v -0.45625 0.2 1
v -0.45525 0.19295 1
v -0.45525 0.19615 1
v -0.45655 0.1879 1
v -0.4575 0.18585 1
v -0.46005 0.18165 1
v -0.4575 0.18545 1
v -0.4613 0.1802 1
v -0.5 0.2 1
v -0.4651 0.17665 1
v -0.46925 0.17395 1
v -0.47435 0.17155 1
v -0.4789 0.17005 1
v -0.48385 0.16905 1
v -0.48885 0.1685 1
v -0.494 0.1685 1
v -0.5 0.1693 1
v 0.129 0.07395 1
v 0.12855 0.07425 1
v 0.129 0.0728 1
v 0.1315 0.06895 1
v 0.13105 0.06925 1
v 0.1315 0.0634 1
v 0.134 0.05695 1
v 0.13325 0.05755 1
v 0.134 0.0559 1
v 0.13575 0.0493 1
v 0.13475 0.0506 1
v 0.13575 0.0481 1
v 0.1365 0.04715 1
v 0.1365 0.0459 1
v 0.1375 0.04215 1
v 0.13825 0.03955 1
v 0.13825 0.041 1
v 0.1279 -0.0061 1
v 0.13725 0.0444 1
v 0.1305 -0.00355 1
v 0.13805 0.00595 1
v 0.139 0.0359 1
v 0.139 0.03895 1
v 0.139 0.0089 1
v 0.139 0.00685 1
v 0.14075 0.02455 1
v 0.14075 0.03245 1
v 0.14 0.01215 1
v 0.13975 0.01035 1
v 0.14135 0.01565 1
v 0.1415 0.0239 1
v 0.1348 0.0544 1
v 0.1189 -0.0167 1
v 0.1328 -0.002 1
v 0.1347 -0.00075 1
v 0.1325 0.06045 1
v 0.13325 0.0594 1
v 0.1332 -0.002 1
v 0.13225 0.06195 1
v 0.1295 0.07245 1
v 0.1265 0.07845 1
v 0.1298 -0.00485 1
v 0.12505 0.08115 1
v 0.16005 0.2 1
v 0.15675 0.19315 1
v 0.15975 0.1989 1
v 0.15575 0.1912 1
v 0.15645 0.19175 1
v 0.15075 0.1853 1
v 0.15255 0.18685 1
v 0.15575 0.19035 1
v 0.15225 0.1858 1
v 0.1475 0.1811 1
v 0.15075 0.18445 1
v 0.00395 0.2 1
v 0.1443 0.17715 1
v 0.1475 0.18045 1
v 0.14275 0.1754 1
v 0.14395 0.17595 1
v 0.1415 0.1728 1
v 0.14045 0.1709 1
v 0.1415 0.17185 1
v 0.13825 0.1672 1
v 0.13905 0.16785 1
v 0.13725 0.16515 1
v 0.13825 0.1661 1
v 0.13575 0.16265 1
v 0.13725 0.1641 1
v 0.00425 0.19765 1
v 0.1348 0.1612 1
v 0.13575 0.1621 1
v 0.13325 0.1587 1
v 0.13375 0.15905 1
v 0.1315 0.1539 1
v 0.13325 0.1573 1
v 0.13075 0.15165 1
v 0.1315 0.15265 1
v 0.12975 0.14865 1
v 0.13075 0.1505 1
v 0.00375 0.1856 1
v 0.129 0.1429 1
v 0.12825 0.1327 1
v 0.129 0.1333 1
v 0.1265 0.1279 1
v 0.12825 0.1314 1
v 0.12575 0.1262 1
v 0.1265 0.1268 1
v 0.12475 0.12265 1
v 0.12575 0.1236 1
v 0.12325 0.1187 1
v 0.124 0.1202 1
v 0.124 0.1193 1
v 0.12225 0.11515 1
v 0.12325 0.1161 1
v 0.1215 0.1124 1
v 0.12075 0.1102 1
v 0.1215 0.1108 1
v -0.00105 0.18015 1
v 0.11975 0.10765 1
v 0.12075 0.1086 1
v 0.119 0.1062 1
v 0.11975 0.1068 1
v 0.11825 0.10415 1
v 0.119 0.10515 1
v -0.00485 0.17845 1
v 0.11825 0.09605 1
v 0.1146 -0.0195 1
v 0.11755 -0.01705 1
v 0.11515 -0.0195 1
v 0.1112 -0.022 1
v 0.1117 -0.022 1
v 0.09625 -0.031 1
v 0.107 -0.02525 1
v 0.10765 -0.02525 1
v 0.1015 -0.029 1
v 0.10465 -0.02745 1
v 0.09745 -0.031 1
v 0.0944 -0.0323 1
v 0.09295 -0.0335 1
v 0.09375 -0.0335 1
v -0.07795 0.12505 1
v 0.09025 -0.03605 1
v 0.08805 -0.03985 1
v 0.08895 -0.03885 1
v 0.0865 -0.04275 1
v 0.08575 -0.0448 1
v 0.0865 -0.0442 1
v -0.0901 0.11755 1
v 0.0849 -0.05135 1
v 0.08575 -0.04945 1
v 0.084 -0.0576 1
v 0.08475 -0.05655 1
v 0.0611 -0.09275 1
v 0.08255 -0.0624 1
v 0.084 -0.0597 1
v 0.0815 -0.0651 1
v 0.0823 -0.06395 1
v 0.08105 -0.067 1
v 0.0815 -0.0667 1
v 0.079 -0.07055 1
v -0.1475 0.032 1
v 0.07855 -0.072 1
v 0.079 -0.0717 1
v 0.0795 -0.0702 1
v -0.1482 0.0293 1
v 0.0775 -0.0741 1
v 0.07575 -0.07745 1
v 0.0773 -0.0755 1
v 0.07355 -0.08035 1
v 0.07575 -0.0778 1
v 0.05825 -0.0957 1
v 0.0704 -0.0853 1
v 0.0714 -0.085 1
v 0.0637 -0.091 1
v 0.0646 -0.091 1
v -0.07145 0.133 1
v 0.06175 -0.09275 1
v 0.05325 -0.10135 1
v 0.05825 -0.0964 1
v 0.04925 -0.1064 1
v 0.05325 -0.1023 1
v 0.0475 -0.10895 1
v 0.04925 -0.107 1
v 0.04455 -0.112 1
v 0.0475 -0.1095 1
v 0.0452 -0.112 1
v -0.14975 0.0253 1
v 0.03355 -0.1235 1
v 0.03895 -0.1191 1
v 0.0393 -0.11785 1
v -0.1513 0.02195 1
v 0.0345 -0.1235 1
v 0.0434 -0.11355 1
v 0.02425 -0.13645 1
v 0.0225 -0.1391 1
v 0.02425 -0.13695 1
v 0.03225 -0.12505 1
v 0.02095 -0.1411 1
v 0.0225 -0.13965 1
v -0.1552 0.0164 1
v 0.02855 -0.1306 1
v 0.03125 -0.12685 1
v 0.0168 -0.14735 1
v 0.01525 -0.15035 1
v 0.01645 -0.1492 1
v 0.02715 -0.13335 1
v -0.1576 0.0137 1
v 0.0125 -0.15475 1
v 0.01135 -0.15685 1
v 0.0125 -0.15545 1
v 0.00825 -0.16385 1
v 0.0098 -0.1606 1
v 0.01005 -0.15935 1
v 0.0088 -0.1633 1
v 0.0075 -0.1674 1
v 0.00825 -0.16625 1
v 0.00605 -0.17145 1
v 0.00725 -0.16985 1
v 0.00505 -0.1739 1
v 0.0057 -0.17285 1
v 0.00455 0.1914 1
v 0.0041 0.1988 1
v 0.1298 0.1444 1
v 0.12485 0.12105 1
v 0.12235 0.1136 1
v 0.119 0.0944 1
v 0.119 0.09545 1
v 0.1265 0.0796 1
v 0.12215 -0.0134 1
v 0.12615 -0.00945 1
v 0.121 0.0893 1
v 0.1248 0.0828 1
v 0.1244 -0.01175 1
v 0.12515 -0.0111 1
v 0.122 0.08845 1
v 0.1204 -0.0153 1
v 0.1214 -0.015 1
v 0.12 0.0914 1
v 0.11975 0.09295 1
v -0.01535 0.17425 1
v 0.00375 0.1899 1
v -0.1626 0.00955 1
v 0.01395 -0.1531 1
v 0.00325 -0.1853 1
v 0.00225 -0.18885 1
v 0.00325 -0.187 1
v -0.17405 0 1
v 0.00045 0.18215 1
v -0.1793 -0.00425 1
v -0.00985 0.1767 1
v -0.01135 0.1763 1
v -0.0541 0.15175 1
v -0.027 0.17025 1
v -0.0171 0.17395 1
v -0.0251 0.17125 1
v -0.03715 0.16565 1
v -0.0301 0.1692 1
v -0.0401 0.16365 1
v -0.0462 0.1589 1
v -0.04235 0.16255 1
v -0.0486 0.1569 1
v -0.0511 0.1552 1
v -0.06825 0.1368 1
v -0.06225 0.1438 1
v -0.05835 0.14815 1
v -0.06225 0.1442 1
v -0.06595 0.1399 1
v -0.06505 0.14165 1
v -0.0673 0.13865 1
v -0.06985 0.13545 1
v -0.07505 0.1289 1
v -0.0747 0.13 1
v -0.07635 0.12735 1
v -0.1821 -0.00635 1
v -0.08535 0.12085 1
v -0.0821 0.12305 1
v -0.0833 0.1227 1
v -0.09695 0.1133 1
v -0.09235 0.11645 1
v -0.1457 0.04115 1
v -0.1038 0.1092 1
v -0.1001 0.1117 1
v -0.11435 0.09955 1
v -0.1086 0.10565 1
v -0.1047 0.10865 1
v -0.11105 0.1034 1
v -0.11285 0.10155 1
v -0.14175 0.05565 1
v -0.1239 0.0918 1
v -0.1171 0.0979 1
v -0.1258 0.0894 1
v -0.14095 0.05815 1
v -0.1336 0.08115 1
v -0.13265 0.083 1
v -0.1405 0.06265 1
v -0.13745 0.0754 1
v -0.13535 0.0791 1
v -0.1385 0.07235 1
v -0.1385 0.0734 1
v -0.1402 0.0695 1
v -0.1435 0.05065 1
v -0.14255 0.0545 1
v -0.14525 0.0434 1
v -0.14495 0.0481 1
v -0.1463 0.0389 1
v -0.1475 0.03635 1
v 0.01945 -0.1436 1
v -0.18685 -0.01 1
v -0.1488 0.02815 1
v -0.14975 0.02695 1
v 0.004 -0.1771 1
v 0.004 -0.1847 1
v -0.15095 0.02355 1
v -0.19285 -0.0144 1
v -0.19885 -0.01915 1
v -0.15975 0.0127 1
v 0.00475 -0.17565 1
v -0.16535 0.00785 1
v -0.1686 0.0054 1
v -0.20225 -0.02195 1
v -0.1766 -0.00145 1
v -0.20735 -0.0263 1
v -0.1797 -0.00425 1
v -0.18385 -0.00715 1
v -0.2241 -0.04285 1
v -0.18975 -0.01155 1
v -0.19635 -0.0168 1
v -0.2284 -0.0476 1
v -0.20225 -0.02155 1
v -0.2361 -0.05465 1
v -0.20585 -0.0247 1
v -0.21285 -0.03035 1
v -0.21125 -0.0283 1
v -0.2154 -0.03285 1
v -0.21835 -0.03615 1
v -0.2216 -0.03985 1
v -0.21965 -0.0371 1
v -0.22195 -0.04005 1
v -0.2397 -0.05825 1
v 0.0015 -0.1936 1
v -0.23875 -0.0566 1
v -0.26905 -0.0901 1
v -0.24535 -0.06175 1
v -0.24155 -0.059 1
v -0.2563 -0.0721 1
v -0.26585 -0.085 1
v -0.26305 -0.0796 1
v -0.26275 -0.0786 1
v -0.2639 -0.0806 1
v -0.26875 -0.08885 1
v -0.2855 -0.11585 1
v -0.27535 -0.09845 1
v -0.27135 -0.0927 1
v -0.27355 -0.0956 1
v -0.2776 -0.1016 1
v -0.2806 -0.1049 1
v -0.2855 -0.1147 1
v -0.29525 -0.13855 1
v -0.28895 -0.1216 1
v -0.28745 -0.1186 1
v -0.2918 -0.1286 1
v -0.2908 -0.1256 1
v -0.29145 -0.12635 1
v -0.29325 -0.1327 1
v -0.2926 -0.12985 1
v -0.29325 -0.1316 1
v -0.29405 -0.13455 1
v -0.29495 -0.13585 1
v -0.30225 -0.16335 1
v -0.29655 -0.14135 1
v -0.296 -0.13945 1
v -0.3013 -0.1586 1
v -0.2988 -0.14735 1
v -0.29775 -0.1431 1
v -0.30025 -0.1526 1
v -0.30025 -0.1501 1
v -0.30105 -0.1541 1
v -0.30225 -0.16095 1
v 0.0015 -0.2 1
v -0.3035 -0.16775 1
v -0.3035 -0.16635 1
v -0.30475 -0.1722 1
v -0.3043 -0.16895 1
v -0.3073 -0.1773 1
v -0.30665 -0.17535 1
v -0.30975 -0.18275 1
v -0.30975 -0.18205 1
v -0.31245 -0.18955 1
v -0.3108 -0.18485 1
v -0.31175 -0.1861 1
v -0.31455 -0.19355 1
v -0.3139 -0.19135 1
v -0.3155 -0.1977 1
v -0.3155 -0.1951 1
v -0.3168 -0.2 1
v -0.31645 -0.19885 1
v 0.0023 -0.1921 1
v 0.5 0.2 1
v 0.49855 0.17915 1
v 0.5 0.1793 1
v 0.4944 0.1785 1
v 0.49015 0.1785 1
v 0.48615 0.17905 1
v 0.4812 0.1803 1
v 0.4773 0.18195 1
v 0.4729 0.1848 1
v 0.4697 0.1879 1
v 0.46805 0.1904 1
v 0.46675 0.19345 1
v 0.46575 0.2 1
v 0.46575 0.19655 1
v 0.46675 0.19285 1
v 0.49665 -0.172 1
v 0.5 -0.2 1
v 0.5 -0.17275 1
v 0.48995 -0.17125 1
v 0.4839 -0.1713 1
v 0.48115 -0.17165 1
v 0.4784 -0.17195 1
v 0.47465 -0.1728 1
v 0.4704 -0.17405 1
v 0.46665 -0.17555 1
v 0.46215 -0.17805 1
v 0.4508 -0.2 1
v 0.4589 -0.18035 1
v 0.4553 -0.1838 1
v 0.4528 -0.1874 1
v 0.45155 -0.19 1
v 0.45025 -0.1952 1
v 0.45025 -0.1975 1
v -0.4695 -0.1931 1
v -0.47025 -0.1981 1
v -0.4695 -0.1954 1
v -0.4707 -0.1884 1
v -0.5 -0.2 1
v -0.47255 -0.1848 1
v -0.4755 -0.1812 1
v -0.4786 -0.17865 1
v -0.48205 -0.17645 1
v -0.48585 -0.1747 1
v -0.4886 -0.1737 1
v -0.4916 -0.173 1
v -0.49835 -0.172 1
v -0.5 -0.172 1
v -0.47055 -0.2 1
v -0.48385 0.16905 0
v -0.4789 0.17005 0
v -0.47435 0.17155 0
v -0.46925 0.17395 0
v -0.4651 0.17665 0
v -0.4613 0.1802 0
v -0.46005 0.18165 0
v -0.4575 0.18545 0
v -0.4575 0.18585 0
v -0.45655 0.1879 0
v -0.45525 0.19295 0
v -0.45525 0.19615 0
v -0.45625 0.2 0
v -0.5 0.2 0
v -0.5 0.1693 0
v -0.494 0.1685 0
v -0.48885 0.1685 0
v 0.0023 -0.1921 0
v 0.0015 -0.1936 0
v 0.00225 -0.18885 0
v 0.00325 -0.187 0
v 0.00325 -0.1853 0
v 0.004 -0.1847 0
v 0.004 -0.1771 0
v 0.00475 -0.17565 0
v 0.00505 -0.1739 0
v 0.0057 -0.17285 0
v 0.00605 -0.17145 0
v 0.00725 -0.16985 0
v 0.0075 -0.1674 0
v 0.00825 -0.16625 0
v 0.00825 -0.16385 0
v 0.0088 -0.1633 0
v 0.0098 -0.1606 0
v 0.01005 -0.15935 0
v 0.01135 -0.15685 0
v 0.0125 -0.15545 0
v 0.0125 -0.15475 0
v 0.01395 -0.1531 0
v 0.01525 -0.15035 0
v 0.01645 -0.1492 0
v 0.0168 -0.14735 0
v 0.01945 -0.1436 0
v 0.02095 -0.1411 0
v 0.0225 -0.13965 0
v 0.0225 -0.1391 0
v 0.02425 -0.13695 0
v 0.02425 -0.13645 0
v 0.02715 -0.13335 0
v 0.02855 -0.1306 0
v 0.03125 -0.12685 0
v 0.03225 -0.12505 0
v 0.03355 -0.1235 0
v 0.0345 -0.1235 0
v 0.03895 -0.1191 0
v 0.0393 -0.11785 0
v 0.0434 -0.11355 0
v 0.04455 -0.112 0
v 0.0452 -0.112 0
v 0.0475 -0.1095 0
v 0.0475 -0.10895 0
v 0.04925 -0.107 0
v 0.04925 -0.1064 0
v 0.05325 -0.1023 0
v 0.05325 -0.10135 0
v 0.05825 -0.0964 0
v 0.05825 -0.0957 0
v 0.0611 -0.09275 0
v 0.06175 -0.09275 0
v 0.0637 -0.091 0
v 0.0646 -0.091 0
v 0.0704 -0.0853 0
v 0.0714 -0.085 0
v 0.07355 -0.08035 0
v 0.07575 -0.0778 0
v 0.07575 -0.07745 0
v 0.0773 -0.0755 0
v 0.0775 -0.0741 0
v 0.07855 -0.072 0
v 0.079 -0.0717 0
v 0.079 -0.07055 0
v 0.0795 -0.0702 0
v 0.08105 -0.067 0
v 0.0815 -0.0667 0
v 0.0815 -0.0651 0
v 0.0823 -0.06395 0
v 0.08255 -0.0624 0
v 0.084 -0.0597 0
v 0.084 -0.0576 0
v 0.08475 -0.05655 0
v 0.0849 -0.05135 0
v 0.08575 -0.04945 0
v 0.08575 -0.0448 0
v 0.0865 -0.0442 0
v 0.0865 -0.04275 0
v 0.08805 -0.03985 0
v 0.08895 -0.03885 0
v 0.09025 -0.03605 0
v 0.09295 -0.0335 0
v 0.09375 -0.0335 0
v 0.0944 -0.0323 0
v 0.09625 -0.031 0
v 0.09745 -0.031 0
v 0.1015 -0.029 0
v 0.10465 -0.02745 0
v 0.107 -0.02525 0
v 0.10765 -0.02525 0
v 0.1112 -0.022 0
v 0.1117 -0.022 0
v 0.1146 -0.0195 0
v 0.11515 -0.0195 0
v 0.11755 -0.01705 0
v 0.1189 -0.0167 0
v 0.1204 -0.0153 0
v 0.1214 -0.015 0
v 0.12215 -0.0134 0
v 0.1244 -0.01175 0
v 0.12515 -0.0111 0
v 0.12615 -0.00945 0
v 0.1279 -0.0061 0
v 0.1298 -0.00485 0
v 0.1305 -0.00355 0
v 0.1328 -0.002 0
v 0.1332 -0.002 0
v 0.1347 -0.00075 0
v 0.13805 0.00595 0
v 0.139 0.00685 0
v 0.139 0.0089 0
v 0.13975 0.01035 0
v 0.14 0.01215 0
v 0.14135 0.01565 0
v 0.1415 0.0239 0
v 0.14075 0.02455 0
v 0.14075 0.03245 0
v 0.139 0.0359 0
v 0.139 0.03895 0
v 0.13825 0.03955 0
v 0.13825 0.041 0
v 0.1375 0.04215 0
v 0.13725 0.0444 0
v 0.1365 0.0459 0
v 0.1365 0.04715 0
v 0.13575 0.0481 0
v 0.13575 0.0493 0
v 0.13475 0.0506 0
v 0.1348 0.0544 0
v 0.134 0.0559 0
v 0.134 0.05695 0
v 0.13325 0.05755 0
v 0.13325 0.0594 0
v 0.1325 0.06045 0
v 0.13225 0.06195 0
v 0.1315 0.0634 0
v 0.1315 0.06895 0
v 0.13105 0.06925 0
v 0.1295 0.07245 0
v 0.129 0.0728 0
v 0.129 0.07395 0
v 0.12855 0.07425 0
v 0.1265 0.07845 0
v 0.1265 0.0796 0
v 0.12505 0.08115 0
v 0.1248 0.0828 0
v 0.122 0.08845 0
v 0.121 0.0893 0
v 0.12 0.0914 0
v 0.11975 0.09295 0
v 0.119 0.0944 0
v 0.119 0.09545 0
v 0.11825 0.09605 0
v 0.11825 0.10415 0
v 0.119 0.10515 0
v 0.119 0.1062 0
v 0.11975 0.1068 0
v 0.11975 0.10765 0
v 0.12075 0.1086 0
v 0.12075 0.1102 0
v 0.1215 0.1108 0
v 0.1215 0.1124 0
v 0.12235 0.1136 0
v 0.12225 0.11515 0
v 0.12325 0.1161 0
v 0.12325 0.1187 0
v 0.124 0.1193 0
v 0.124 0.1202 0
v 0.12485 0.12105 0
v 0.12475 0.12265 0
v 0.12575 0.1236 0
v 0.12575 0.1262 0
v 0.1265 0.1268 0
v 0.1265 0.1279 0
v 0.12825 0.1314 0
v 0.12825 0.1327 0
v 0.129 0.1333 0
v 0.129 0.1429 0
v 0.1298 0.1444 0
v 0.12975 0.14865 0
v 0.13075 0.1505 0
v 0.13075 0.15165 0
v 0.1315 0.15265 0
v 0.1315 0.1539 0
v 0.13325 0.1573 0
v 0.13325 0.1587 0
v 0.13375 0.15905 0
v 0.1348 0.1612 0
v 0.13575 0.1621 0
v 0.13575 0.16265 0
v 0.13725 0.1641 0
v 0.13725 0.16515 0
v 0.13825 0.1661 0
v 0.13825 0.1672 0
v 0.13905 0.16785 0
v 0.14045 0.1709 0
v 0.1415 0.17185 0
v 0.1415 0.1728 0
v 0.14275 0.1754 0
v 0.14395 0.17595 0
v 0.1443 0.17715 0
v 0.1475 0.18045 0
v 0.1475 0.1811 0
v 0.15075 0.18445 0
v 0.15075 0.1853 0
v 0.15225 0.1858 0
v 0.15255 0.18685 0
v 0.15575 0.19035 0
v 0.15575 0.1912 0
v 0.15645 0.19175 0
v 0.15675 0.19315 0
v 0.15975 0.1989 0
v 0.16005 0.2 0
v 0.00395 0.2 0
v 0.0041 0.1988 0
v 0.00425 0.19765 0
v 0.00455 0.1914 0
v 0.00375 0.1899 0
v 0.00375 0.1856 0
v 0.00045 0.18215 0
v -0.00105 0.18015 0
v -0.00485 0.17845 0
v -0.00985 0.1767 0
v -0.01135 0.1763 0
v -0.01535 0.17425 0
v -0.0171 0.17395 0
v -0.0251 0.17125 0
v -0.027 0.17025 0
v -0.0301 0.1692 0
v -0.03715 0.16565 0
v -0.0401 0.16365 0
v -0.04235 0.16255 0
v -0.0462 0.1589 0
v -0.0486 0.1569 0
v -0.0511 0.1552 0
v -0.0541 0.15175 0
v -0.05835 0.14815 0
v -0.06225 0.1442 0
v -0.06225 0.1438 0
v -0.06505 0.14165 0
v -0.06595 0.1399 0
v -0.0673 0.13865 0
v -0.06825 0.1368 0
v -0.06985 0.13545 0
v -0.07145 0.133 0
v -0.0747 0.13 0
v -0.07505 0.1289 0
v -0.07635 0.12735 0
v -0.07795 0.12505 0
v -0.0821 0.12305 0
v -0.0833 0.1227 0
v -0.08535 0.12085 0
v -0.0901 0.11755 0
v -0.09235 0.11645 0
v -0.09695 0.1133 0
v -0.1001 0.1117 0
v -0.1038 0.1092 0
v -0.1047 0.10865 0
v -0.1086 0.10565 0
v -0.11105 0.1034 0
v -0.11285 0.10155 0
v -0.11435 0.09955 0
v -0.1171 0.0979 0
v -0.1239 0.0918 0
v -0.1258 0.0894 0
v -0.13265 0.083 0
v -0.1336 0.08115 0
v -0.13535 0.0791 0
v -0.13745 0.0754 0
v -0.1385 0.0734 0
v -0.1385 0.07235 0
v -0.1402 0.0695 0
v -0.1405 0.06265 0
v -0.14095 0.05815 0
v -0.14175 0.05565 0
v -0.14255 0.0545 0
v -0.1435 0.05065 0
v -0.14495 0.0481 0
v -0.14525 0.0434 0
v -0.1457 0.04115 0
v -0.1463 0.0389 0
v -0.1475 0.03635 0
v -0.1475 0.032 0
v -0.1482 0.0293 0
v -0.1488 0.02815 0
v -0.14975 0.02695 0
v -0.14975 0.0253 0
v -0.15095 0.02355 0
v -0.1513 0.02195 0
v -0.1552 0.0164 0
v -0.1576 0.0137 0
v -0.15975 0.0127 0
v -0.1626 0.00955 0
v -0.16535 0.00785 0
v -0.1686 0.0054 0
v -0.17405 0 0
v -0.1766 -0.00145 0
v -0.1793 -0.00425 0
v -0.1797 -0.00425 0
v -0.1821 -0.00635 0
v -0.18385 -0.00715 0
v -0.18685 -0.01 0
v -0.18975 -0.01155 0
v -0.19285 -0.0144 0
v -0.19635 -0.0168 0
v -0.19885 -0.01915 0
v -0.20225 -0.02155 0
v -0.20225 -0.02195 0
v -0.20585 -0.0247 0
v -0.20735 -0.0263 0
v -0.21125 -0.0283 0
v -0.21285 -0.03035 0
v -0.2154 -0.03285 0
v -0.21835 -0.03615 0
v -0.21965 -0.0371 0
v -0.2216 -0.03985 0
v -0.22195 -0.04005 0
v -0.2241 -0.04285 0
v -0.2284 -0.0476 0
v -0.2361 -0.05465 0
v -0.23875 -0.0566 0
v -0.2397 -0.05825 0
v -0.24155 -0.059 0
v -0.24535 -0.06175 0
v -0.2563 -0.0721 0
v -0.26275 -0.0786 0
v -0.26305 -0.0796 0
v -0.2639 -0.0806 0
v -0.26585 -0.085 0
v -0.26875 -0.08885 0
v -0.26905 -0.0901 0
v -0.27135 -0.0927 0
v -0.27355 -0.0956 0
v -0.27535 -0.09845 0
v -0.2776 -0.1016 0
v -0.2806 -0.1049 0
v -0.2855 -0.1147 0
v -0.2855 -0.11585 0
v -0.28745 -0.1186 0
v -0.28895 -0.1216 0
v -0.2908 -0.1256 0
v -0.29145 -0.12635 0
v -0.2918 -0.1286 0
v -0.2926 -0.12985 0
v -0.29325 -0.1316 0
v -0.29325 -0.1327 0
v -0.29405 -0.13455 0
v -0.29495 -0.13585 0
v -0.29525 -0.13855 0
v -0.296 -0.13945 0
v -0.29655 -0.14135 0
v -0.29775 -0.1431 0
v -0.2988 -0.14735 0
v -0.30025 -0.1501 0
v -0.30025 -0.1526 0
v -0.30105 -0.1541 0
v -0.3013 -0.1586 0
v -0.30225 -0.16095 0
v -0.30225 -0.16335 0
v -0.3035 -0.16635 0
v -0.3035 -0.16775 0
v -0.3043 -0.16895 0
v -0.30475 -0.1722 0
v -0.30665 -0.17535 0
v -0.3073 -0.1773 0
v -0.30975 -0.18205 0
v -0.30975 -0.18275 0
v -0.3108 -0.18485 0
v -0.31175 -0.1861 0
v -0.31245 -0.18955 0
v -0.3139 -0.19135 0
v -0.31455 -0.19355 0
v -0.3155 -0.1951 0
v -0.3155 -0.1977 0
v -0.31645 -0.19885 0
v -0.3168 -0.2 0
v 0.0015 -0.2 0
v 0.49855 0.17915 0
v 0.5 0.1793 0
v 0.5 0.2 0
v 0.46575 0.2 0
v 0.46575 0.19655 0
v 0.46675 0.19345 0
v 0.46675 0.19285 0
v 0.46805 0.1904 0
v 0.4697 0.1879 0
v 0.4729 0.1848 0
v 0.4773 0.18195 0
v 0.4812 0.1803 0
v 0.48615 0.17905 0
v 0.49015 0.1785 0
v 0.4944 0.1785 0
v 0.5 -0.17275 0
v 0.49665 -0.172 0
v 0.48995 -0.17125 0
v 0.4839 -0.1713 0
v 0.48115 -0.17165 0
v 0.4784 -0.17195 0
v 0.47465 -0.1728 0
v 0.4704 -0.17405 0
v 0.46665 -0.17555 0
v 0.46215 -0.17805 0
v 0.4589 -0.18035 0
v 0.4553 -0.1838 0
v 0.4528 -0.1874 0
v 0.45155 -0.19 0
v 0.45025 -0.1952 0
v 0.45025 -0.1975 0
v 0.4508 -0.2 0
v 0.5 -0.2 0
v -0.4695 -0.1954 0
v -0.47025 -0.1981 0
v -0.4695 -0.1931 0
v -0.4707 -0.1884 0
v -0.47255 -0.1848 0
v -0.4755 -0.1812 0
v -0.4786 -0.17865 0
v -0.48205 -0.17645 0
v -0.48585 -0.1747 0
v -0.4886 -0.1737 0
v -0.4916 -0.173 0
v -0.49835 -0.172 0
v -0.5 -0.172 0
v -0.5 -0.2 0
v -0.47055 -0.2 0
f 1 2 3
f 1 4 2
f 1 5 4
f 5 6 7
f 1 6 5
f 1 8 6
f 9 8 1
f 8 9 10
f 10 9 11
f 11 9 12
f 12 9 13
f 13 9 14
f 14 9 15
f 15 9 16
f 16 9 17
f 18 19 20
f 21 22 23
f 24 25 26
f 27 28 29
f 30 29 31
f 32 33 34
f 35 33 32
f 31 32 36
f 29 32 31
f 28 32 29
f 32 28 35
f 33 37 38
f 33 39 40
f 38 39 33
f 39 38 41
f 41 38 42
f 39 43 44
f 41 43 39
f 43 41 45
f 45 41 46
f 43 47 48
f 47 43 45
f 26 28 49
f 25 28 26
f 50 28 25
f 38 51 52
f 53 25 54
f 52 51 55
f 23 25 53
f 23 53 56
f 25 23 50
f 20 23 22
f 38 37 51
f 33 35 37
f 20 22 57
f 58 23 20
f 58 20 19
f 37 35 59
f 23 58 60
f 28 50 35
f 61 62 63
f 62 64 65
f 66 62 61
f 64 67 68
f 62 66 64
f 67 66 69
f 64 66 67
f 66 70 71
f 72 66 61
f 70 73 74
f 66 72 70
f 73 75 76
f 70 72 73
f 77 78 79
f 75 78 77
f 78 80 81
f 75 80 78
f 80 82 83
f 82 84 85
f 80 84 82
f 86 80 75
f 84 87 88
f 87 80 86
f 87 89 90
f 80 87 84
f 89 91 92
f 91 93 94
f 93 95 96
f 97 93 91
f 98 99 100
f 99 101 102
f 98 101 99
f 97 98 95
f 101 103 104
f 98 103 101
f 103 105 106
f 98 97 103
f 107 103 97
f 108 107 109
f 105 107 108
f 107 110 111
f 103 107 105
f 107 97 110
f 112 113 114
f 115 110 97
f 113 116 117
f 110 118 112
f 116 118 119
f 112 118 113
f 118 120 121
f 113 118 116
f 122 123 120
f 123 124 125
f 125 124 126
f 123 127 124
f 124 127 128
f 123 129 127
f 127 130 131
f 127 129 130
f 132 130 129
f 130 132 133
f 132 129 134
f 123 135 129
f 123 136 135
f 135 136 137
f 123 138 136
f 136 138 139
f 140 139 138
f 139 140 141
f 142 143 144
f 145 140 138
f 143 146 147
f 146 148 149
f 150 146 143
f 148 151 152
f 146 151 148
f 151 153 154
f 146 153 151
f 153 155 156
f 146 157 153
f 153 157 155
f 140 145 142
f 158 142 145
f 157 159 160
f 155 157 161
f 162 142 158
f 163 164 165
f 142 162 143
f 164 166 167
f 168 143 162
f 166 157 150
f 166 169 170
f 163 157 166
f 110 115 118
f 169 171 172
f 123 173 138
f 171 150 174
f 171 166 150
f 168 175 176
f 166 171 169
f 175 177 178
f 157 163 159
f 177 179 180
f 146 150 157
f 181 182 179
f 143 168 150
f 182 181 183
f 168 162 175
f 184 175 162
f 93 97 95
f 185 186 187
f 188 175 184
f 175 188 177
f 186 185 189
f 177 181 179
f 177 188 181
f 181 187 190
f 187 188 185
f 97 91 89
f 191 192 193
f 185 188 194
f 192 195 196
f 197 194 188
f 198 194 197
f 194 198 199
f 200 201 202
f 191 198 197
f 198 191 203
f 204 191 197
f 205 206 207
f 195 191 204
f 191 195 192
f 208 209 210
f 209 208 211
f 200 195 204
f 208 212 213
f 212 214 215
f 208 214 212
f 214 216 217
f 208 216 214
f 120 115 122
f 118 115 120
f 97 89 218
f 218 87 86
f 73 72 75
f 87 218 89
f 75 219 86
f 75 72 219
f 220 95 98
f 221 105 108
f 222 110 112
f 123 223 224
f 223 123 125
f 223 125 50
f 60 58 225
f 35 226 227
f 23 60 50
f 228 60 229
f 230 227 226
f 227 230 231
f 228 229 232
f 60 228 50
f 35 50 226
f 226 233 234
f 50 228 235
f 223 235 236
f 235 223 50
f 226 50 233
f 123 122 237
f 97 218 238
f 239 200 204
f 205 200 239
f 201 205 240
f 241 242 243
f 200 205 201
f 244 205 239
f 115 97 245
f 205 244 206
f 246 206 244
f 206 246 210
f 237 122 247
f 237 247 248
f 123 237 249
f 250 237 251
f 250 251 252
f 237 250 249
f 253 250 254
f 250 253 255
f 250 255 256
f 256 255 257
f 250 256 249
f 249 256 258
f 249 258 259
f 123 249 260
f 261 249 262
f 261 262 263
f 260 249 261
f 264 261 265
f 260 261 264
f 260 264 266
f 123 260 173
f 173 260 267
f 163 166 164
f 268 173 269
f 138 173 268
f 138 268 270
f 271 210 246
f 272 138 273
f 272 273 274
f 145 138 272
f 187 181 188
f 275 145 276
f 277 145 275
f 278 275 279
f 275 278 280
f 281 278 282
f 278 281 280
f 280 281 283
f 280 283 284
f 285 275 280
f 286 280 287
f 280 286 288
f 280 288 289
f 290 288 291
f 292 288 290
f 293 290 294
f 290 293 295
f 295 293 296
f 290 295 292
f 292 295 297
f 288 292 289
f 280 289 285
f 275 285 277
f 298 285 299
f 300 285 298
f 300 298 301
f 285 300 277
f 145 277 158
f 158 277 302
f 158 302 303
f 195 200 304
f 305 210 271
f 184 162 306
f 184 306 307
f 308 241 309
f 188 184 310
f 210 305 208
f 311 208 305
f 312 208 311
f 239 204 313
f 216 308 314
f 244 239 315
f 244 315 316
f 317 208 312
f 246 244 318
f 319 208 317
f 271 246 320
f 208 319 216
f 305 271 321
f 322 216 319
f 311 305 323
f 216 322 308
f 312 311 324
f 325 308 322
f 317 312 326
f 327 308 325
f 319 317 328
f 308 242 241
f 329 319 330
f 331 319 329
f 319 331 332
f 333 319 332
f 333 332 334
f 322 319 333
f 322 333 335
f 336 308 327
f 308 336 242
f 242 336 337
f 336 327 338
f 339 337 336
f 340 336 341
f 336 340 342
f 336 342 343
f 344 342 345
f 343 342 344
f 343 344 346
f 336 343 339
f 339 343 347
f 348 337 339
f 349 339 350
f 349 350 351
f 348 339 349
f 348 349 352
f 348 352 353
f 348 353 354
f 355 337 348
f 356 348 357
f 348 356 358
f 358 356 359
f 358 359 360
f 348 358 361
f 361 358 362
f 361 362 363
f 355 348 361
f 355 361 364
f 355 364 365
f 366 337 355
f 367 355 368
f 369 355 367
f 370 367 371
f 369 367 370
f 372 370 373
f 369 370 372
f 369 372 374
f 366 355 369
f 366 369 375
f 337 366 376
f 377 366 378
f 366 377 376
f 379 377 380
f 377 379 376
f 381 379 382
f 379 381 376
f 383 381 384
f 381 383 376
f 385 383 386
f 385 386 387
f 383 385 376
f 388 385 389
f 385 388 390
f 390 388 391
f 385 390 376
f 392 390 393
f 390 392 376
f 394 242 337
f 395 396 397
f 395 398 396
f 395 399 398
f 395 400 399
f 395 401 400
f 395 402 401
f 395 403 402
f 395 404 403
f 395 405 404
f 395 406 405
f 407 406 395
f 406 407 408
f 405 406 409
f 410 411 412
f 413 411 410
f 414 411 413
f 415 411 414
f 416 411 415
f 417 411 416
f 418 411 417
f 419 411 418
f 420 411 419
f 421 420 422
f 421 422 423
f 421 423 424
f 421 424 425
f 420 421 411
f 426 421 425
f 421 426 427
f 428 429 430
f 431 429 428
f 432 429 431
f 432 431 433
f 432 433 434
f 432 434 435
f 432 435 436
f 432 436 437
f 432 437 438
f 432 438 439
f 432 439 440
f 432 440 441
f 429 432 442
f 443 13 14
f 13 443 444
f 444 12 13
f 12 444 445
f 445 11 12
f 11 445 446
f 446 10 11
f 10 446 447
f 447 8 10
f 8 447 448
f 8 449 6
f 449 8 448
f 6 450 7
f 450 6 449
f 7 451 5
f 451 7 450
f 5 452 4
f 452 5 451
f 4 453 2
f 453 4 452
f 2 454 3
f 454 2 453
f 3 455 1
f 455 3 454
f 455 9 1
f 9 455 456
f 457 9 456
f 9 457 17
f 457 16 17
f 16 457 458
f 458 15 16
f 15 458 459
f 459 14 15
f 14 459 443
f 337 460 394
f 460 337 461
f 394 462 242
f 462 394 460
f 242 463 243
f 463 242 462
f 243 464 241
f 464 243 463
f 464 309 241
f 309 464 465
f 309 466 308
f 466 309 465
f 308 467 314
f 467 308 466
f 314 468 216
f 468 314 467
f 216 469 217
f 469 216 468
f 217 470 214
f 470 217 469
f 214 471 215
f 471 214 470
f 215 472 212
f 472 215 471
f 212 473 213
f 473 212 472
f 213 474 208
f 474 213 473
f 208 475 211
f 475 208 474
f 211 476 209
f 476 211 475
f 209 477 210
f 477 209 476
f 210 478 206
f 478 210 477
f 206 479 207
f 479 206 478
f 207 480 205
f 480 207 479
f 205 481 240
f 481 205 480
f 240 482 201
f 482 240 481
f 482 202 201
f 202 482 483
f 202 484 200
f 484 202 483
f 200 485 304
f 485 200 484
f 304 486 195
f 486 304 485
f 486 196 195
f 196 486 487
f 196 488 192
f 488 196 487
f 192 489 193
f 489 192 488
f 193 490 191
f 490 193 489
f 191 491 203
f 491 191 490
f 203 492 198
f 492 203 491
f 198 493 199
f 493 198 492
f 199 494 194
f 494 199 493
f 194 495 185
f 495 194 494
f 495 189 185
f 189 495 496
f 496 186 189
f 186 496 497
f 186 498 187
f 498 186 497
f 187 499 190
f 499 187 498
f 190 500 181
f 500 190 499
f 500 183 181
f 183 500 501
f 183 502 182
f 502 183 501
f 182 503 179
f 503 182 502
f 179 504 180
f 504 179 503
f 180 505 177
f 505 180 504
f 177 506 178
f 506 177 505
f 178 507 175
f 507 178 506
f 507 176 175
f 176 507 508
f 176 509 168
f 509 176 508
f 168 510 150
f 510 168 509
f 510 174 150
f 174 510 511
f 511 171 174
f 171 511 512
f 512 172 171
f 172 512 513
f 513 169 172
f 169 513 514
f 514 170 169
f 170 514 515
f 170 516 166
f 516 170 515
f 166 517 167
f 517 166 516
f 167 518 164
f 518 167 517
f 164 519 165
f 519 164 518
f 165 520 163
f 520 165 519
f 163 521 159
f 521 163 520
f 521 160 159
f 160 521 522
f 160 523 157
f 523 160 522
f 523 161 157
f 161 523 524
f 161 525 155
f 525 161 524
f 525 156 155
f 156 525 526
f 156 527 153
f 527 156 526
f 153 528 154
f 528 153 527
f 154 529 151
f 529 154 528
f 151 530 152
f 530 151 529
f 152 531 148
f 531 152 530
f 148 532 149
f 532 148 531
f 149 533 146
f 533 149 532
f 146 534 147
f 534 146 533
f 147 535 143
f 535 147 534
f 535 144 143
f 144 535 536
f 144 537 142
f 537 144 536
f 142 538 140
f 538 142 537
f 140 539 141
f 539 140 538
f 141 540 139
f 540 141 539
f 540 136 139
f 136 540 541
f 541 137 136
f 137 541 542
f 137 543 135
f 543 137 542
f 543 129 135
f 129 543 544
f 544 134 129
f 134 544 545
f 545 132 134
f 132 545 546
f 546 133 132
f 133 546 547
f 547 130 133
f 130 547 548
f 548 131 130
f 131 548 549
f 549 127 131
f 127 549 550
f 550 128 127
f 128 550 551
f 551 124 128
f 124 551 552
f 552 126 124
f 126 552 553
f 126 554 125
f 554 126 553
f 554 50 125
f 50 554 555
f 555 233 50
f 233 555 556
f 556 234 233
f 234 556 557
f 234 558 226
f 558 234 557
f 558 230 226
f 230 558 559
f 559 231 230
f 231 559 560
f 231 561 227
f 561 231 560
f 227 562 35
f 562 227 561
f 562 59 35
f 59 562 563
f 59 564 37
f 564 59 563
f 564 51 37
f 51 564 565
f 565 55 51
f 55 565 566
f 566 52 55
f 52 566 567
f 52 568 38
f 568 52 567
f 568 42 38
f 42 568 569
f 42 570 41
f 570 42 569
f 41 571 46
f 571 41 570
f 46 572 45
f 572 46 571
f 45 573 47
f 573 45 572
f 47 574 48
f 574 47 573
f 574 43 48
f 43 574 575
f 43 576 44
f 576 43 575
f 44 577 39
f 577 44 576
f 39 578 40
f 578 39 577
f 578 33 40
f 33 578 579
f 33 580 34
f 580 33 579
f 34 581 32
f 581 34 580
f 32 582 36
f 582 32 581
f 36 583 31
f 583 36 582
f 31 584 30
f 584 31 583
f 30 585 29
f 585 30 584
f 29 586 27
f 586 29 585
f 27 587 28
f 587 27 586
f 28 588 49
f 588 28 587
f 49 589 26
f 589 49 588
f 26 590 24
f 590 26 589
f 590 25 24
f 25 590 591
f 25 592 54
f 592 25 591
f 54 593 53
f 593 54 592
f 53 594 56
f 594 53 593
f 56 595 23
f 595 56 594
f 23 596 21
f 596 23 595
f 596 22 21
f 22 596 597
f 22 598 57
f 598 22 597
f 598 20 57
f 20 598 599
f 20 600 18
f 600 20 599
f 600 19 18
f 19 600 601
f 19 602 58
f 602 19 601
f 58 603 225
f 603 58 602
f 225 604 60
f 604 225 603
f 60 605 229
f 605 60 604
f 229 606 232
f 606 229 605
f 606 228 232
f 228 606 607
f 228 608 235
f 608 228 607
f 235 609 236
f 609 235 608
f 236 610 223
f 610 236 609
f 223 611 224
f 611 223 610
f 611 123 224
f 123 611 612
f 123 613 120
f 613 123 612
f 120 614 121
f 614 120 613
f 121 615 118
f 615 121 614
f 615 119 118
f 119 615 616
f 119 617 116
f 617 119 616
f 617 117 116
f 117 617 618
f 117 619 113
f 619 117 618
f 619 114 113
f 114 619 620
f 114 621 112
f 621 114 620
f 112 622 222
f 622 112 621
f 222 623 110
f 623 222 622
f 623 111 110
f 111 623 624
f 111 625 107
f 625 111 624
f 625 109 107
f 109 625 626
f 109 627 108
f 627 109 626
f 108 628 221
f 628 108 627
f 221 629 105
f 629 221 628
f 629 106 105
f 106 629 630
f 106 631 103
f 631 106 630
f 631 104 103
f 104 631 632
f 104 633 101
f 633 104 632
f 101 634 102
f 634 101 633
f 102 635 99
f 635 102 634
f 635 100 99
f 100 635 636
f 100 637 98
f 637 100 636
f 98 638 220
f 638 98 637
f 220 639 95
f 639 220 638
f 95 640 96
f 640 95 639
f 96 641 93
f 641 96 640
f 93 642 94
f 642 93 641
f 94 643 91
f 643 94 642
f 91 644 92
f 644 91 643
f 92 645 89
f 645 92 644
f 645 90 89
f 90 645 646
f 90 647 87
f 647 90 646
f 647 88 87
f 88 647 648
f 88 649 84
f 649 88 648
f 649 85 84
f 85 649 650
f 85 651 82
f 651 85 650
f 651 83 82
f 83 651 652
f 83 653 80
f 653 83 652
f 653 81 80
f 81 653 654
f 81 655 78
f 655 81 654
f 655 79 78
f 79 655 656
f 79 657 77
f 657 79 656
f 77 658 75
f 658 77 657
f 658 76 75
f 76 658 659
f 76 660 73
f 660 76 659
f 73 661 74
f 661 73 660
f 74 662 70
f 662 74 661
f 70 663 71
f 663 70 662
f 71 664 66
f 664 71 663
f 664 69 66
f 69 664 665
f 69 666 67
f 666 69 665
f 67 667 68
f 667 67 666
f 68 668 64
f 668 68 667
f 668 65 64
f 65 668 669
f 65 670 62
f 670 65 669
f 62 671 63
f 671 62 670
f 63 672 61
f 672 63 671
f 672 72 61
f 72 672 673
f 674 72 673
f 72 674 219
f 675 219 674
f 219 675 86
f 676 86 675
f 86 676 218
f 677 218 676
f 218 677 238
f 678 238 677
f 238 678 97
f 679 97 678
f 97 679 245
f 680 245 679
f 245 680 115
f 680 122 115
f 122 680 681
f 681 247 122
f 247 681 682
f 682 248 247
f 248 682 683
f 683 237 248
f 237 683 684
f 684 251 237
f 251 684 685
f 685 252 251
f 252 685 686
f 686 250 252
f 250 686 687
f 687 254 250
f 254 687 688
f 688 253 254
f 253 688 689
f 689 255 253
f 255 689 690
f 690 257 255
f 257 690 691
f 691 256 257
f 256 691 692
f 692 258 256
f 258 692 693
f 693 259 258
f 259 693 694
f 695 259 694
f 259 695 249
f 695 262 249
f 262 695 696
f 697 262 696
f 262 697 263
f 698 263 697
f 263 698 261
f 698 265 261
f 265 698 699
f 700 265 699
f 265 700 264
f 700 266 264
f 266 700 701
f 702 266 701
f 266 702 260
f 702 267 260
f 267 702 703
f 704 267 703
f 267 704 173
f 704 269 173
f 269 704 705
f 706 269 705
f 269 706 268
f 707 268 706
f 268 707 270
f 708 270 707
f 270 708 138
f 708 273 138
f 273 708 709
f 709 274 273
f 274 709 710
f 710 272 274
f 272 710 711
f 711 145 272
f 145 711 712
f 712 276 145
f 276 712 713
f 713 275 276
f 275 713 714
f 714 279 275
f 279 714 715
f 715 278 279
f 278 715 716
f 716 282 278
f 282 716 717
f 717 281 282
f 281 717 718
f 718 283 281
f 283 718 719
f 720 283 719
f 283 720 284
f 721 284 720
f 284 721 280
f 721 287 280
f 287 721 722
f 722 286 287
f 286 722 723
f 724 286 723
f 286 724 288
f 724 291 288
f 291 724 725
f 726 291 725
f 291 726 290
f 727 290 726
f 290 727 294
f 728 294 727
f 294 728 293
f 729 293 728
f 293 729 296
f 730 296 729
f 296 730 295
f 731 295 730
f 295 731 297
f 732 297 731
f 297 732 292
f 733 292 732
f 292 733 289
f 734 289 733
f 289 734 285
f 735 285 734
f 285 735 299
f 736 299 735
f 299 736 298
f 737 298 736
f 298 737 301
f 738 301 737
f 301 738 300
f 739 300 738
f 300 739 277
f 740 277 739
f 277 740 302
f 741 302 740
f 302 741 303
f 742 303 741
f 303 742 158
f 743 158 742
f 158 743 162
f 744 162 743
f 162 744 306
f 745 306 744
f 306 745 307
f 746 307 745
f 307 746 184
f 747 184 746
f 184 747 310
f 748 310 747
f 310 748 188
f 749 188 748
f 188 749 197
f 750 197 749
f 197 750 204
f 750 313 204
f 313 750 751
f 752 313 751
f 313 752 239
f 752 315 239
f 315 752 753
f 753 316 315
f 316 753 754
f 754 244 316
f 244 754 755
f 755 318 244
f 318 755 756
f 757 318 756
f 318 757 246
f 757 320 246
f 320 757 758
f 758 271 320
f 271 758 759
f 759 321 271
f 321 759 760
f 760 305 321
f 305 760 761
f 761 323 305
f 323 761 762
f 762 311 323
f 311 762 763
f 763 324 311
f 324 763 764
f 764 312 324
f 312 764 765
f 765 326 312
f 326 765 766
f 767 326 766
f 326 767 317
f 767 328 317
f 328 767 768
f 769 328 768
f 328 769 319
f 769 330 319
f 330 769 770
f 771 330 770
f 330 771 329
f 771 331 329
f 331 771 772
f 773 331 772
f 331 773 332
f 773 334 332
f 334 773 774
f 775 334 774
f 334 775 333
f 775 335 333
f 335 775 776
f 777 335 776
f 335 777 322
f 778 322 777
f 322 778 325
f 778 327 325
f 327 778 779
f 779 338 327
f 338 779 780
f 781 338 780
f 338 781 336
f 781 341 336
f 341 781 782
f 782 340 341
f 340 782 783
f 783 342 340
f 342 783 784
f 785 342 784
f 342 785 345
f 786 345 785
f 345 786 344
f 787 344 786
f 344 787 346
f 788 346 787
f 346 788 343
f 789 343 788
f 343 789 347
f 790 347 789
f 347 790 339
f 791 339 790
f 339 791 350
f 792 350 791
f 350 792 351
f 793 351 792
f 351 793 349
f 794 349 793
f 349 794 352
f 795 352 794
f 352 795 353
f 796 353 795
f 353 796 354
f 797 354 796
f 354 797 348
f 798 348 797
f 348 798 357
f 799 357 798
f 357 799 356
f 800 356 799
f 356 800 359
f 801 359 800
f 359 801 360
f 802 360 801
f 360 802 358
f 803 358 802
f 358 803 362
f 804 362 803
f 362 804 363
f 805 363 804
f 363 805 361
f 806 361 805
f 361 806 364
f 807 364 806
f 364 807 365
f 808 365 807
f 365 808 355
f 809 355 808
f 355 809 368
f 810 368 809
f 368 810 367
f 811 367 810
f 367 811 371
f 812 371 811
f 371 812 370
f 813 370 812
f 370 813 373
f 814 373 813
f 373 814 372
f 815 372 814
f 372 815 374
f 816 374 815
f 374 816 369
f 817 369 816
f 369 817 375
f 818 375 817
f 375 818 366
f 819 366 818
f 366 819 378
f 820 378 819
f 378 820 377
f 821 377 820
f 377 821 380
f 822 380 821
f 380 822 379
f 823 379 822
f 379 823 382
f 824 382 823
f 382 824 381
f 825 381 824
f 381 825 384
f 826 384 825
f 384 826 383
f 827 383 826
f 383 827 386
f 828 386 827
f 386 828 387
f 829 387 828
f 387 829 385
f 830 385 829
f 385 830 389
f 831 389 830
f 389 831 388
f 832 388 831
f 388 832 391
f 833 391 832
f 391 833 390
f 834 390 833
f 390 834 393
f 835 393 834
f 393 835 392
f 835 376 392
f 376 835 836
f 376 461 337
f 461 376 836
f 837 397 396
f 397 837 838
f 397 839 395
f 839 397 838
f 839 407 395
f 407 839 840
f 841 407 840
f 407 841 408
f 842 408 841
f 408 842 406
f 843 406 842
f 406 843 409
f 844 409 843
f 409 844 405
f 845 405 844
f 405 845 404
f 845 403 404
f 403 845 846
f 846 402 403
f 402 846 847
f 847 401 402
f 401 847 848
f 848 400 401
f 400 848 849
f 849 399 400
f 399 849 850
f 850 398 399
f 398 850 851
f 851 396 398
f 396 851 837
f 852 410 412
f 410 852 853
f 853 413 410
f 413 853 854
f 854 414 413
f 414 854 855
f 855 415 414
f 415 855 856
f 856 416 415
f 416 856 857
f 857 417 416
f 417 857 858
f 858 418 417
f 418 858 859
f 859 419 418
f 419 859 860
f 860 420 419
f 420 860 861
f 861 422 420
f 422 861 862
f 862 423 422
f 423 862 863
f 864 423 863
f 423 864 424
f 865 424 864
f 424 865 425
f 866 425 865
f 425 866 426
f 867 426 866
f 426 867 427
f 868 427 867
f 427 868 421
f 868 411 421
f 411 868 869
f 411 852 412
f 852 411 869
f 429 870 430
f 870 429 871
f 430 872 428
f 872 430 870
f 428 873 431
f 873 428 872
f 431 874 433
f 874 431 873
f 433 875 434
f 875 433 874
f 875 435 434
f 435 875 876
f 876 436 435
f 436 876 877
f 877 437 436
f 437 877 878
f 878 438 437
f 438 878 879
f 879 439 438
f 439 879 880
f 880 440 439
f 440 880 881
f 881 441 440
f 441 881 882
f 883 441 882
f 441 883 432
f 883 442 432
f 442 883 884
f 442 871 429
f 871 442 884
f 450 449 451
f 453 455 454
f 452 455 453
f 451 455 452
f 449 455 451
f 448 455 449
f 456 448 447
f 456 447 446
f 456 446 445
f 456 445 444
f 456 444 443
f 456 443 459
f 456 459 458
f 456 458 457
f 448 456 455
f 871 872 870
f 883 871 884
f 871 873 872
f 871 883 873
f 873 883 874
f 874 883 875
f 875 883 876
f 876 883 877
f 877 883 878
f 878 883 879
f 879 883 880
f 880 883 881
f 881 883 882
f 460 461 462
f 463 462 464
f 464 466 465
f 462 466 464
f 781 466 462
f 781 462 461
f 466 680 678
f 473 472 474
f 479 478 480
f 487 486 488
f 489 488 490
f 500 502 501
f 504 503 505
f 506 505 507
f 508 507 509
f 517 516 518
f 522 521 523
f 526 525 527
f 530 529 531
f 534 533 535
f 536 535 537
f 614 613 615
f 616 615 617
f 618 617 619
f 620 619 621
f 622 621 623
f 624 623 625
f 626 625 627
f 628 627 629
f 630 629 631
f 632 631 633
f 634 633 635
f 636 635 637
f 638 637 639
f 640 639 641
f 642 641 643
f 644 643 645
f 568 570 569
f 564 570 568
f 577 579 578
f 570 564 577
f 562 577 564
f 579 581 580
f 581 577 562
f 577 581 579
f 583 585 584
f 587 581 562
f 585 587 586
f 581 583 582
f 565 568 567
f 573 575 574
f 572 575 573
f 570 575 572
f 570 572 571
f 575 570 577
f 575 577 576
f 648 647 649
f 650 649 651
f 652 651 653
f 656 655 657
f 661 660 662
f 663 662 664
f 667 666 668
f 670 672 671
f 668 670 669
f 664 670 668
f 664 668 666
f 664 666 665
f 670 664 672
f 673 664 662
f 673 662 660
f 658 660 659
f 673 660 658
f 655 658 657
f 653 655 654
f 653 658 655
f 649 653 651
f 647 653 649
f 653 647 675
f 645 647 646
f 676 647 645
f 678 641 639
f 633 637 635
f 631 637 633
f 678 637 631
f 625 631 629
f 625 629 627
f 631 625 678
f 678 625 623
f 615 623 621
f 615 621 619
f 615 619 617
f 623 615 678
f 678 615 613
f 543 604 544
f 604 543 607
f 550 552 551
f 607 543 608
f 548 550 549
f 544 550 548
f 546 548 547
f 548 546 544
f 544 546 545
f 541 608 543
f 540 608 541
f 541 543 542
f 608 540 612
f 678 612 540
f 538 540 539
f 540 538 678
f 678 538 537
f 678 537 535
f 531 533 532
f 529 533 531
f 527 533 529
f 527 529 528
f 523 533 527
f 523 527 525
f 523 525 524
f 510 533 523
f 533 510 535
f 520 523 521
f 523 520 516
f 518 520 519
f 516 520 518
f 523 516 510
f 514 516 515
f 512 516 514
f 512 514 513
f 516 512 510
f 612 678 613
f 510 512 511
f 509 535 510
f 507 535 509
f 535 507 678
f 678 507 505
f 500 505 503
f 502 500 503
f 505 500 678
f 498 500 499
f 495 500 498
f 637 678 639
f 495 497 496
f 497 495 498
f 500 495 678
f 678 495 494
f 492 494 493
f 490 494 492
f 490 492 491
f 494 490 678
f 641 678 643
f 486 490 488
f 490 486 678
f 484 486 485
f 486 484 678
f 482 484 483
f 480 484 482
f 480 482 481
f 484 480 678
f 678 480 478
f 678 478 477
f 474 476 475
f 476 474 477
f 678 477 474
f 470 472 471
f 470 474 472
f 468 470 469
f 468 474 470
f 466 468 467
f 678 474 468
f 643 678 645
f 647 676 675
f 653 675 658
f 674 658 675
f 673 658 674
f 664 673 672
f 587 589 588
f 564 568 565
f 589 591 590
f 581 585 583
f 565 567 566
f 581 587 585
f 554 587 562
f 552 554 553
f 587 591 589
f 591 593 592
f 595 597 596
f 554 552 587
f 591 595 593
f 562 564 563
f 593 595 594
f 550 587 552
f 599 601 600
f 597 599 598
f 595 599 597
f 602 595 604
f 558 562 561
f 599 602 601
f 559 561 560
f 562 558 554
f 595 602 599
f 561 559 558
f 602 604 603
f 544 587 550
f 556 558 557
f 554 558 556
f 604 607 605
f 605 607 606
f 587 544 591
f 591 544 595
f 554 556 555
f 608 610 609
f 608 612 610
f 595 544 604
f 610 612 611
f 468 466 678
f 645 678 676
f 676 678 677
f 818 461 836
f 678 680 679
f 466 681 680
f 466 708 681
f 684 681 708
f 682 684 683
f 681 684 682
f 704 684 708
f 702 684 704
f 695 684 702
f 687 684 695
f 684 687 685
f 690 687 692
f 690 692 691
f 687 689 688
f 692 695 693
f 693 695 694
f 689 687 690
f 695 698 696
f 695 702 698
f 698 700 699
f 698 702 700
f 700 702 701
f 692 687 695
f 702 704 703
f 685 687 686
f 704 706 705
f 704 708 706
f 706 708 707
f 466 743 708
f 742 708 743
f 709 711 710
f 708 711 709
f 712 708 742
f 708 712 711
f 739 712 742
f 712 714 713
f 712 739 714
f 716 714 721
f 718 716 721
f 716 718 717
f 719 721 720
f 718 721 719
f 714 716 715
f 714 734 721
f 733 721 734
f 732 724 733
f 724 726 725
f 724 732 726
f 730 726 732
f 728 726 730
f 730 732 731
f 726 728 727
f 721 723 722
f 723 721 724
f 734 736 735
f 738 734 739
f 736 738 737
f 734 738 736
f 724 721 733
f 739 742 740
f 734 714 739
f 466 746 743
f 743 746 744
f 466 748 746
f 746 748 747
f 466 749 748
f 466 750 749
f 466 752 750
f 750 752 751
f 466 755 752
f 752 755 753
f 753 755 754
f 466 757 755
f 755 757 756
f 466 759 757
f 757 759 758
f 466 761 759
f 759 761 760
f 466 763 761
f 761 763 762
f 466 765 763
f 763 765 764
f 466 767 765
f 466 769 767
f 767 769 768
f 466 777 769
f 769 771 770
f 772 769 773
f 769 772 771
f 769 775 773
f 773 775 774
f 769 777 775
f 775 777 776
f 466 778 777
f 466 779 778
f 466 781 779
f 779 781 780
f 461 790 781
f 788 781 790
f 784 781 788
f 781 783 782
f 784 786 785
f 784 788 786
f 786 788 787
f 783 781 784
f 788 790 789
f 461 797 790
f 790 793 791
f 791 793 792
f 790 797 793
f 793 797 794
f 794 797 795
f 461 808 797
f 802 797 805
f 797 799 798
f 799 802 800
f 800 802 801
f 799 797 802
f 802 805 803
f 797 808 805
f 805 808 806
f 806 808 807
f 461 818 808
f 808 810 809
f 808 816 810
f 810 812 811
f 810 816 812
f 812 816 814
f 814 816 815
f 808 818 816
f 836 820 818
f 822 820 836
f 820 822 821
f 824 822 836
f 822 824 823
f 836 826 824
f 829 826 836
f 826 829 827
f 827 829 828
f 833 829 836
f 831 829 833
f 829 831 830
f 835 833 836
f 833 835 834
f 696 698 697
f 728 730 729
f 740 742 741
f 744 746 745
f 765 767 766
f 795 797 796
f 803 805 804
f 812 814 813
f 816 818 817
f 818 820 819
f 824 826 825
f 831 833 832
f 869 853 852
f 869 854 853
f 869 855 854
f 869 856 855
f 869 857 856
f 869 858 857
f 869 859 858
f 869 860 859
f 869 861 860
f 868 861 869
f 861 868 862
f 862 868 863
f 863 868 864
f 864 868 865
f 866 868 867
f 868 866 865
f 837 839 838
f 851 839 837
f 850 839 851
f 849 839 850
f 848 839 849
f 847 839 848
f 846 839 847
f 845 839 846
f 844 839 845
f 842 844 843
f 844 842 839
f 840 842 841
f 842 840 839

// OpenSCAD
module card5orange_1()
{
 /* Generated by trace2scad version 20150415
    http://aggregate.org/MAKE/TRACE2SCAD/
    Optimized model has 445/921 original points
 */
 color([0.5, 0.5, 0.5])
 assign(minx=0) /* polygon minx=0 */
 assign(miny=0) /* polygon miny=0 */
 assign(maxx=20000) /* polygon maxx=20000 */
 assign(maxy=8000) /* polygon maxy=8000 */
 assign(dx=maxx-minx)
 assign(dy=maxy-miny)
 assign(maxd=((dx>dy)?dx:dy))
 scale([1/maxd, 1/maxd, 1])
 translate([-minx-dx/2, -miny-dy/2, 0])
 linear_extrude(height=1, convexity=445)
 union() {
  union() {
   polygon([[0,7693],[0,7386],[120,7370],[223,7370],[323,7381],[422,7401],[513,7431],[615,7479],[698,7533],[774,7604],[799,7633],[850,7709],[850,7717],[869,7758],[895,7859],[895,7923],[875,8000],[0,8000]], convexity=5);
   polygon([[10082,7976],[10085,7953],[10091,7828],[10075,7798],[10075,7712],[10009,7643],[9979,7603],[9903,7569],[9803,7534],[9773,7526],[9693,7485],[9658,7479],[9498,7425],[9460,7405],[9398,7384],[9257,7313],[9198,7273],[9153,7251],[9076,7178],[9028,7138],[8978,7104],[8918,7035],[8833,6963],[8755,6884],[8755,6876],[8699,6833],[8681,6798],[8654,6773],[8635,6736],[8603,6709],[8571,6660],[8506,6600],[8499,6578],[8473,6547],[8441,6501],[8358,6461],[8334,6454],[8293,6417],[8198,6351],[8153,6329],[8061,6266],[7998,6234],[7924,6184],[7906,6173],[7828,6113],[7779,6068],[7743,6031],[7713,5991],[7658,5958],[7522,5836],[7484,5788],[7347,5660],[7328,5623],[7293,5582],[7251,5508],[7230,5468],[7230,5447],[7196,5390],[7190,5253],[7181,5163],[7165,5113],[7149,5090],[7130,5013],[7101,4962],[7095,4868],[7086,4823],[7074,4778],[7050,4727],[7050,4640],[7036,4586],[7024,4563],[7005,4539],[7005,4506],[6981,4471],[6974,4439],[6896,4328],[6848,4274],[6805,4254],[6748,4191],[6693,4157],[6628,4108],[6519,4000],[6468,3971],[6414,3915],[6406,3915],[6358,3873],[6323,3857],[6263,3800],[6205,3769],[6143,3712],[6073,3664],[6023,3617],[5955,3569],[5955,3561],[5883,3506],[5853,3474],[5775,3434],[5743,3393],[5692,3343],[5633,3277],[5607,3258],[5568,3203],[5561,3199],[5518,3143],[5432,3048],[5278,2907],[5225,2868],[5206,2835],[5169,2820],[5093,2765],[4874,2558],[4745,2428],[4739,2408],[4722,2388],[4683,2300],[4625,2223],[4619,2198],[4573,2146],[4529,2088],[4493,2031],[4448,1968],[4388,1902],[4290,1706],[4290,1683],[4251,1628],[4221,1568],[4184,1488],[4171,1473],[4164,1428],[4148,1403],[4135,1368],[4135,1346],[4119,1309],[4101,1283],[4095,1229],[4080,1211],[4069,1173],[4045,1138],[4024,1053],[3995,998],[3995,948],[3979,918],[3974,828],[3955,781],[3955,733],[3930,673],[3930,645],[3914,621],[3905,556],[3867,493],[3854,454],[3805,359],[3805,345],[3784,303],[3765,278],[3751,209],[3722,173],[3709,129],[3690,98],[3690,46],[3671,23],[3664,0],[10030,0],[10030,128],[10046,158],[10045,223],[10065,260],[10065,294],[10080,306],[10080,458],[10095,487],[10101,522],[10114,543],[10121,571],[10145,603],[10150,652],[10165,675],[10165,723],[10176,734],[10196,788],[10201,813],[10227,863],[10250,891],[10250,905],[10279,938],[10305,993],[10329,1016],[10336,1053],[10389,1128],[10419,1178],[10450,1207],[10450,1218],[10485,1261],[10485,1271],[10543,1333],[10571,1388],[10625,1463],[10645,1499],[10671,1530],[10690,1530],[10779,1618],[10786,1643],[10868,1729],[10891,1760],[10904,1760],[10950,1810],[10950,1821],[10985,1860],[10985,1872],[11065,1954],[11065,1973],[11165,2072],[11165,2086],[11222,2145],[11235,2145],[11274,2180],[11292,2180],[11408,2294],[11428,2300],[11471,2393],[11515,2444],[11515,2451],[11546,2490],[11550,2518],[11571,2560],[11580,2566],[11580,2589],[11590,2596],[11621,2660],[11630,2666],[11630,2698],[11646,2721],[11651,2752],[11680,2806],[11680,2848],[11695,2869],[11698,2973],[11715,3011],[11715,3104],[11730,3116],[11730,3145],[11761,3203],[11779,3223],[11805,3279],[11859,3330],[11875,3330],[11888,3354],[11925,3380],[11949,3380],[12030,3420],[12093,3451],[12140,3495],[12153,3495],[12224,3560],[12234,3560],[12292,3610],[12303,3610],[12351,3659],[12378,3666],[12408,3694],[12428,3700],[12443,3732],[12488,3765],[12503,3778],[12523,3811],[12558,3878],[12596,3903],[12610,3929],[12656,3960],[12664,3960],[12694,3985],[12761,4119],[12780,4137],[12780,4178],[12795,4207],[12800,4243],[12827,4313],[12830,4478],[12815,4491],[12815,4649],[12780,4718],[12780,4779],[12765,4791],[12765,4820],[12750,4843],[12745,4888],[12730,4918],[12730,4943],[12715,4962],[12715,4986],[12695,5012],[12696,5088],[12680,5118],[12680,5139],[12665,5151],[12665,5188],[12650,5209],[12645,5239],[12630,5268],[12630,5379],[12621,5385],[12590,5449],[12580,5456],[12580,5479],[12571,5485],[12530,5569],[12530,5592],[12501,5623],[12496,5656],[12440,5769],[12420,5786],[12400,5828],[12395,5859],[12380,5888],[12380,5909],[12365,5921],[12365,6083],[12380,6103],[12380,6124],[12395,6136],[12395,6153],[12415,6172],[12415,6204],[12430,6216],[12430,6248],[12447,6272],[12445,6303],[12465,6322],[12465,6374],[12480,6386],[12480,6404],[12497,6421],[12495,6453],[12515,6472],[12515,6524],[12530,6536],[12530,6558],[12565,6628],[12565,6654],[12580,6666],[12580,6858],[12596,6888],[12595,6973],[12615,7010],[12615,7033],[12630,7053],[12630,7078],[12665,7146],[12665,7174],[12675,7181],[12696,7224],[12715,7242],[12715,7253],[12745,7282],[12745,7303],[12765,7322],[12765,7344],[12781,7357],[12809,7418],[12830,7437],[12830,7456],[12855,7508],[12879,7519],[12886,7543],[12950,7609],[12950,7622],[13015,7689],[13015,7706],[13045,7716],[13051,7737],[13115,7807],[13115,7824],[13129,7835],[13135,7863],[13195,7978],[13201,8000],[10079,8000]], convexity=68);
   polygon([[19315,7966],[19315,7931],[19335,7869],[19335,7857],[19361,7808],[19394,7758],[19458,7696],[19546,7639],[19624,7606],[19723,7581],[19803,7570],[19888,7570],[19971,7583],[20000,7586],[20000,8000],[19315,8000]], convexity=5);
   polygon([[19623,567],[19568,561],[19493,544],[19408,519],[19333,489],[19243,439],[19178,393],[19106,324],[19056,252],[19031,200],[19005,96],[19005,50],[19016,0],[20000,0],[20000,545],[19933,560],[19799,575],[19678,574]], convexity=7);
   polygon([[0,280],[0,0],[589,0],[595,38],[610,92],[610,138],[586,232],[549,304],[490,376],[428,427],[359,471],[283,506],[228,526],[168,540],[33,560],[0,560]], convexity=5);
  }
 }
}

module card5orange()
{
 /* all layers combined, scaled to within a 1mm cube */
 scale([1, 1, 1/1])
 difference() {
  union() {
   scale([1,1,2]) translate([0,0,-0.5]) card5orange_1();
  }
  translate([0,0,-2]) cube([2,2,4],center=true);
 }
}
card5orange();
